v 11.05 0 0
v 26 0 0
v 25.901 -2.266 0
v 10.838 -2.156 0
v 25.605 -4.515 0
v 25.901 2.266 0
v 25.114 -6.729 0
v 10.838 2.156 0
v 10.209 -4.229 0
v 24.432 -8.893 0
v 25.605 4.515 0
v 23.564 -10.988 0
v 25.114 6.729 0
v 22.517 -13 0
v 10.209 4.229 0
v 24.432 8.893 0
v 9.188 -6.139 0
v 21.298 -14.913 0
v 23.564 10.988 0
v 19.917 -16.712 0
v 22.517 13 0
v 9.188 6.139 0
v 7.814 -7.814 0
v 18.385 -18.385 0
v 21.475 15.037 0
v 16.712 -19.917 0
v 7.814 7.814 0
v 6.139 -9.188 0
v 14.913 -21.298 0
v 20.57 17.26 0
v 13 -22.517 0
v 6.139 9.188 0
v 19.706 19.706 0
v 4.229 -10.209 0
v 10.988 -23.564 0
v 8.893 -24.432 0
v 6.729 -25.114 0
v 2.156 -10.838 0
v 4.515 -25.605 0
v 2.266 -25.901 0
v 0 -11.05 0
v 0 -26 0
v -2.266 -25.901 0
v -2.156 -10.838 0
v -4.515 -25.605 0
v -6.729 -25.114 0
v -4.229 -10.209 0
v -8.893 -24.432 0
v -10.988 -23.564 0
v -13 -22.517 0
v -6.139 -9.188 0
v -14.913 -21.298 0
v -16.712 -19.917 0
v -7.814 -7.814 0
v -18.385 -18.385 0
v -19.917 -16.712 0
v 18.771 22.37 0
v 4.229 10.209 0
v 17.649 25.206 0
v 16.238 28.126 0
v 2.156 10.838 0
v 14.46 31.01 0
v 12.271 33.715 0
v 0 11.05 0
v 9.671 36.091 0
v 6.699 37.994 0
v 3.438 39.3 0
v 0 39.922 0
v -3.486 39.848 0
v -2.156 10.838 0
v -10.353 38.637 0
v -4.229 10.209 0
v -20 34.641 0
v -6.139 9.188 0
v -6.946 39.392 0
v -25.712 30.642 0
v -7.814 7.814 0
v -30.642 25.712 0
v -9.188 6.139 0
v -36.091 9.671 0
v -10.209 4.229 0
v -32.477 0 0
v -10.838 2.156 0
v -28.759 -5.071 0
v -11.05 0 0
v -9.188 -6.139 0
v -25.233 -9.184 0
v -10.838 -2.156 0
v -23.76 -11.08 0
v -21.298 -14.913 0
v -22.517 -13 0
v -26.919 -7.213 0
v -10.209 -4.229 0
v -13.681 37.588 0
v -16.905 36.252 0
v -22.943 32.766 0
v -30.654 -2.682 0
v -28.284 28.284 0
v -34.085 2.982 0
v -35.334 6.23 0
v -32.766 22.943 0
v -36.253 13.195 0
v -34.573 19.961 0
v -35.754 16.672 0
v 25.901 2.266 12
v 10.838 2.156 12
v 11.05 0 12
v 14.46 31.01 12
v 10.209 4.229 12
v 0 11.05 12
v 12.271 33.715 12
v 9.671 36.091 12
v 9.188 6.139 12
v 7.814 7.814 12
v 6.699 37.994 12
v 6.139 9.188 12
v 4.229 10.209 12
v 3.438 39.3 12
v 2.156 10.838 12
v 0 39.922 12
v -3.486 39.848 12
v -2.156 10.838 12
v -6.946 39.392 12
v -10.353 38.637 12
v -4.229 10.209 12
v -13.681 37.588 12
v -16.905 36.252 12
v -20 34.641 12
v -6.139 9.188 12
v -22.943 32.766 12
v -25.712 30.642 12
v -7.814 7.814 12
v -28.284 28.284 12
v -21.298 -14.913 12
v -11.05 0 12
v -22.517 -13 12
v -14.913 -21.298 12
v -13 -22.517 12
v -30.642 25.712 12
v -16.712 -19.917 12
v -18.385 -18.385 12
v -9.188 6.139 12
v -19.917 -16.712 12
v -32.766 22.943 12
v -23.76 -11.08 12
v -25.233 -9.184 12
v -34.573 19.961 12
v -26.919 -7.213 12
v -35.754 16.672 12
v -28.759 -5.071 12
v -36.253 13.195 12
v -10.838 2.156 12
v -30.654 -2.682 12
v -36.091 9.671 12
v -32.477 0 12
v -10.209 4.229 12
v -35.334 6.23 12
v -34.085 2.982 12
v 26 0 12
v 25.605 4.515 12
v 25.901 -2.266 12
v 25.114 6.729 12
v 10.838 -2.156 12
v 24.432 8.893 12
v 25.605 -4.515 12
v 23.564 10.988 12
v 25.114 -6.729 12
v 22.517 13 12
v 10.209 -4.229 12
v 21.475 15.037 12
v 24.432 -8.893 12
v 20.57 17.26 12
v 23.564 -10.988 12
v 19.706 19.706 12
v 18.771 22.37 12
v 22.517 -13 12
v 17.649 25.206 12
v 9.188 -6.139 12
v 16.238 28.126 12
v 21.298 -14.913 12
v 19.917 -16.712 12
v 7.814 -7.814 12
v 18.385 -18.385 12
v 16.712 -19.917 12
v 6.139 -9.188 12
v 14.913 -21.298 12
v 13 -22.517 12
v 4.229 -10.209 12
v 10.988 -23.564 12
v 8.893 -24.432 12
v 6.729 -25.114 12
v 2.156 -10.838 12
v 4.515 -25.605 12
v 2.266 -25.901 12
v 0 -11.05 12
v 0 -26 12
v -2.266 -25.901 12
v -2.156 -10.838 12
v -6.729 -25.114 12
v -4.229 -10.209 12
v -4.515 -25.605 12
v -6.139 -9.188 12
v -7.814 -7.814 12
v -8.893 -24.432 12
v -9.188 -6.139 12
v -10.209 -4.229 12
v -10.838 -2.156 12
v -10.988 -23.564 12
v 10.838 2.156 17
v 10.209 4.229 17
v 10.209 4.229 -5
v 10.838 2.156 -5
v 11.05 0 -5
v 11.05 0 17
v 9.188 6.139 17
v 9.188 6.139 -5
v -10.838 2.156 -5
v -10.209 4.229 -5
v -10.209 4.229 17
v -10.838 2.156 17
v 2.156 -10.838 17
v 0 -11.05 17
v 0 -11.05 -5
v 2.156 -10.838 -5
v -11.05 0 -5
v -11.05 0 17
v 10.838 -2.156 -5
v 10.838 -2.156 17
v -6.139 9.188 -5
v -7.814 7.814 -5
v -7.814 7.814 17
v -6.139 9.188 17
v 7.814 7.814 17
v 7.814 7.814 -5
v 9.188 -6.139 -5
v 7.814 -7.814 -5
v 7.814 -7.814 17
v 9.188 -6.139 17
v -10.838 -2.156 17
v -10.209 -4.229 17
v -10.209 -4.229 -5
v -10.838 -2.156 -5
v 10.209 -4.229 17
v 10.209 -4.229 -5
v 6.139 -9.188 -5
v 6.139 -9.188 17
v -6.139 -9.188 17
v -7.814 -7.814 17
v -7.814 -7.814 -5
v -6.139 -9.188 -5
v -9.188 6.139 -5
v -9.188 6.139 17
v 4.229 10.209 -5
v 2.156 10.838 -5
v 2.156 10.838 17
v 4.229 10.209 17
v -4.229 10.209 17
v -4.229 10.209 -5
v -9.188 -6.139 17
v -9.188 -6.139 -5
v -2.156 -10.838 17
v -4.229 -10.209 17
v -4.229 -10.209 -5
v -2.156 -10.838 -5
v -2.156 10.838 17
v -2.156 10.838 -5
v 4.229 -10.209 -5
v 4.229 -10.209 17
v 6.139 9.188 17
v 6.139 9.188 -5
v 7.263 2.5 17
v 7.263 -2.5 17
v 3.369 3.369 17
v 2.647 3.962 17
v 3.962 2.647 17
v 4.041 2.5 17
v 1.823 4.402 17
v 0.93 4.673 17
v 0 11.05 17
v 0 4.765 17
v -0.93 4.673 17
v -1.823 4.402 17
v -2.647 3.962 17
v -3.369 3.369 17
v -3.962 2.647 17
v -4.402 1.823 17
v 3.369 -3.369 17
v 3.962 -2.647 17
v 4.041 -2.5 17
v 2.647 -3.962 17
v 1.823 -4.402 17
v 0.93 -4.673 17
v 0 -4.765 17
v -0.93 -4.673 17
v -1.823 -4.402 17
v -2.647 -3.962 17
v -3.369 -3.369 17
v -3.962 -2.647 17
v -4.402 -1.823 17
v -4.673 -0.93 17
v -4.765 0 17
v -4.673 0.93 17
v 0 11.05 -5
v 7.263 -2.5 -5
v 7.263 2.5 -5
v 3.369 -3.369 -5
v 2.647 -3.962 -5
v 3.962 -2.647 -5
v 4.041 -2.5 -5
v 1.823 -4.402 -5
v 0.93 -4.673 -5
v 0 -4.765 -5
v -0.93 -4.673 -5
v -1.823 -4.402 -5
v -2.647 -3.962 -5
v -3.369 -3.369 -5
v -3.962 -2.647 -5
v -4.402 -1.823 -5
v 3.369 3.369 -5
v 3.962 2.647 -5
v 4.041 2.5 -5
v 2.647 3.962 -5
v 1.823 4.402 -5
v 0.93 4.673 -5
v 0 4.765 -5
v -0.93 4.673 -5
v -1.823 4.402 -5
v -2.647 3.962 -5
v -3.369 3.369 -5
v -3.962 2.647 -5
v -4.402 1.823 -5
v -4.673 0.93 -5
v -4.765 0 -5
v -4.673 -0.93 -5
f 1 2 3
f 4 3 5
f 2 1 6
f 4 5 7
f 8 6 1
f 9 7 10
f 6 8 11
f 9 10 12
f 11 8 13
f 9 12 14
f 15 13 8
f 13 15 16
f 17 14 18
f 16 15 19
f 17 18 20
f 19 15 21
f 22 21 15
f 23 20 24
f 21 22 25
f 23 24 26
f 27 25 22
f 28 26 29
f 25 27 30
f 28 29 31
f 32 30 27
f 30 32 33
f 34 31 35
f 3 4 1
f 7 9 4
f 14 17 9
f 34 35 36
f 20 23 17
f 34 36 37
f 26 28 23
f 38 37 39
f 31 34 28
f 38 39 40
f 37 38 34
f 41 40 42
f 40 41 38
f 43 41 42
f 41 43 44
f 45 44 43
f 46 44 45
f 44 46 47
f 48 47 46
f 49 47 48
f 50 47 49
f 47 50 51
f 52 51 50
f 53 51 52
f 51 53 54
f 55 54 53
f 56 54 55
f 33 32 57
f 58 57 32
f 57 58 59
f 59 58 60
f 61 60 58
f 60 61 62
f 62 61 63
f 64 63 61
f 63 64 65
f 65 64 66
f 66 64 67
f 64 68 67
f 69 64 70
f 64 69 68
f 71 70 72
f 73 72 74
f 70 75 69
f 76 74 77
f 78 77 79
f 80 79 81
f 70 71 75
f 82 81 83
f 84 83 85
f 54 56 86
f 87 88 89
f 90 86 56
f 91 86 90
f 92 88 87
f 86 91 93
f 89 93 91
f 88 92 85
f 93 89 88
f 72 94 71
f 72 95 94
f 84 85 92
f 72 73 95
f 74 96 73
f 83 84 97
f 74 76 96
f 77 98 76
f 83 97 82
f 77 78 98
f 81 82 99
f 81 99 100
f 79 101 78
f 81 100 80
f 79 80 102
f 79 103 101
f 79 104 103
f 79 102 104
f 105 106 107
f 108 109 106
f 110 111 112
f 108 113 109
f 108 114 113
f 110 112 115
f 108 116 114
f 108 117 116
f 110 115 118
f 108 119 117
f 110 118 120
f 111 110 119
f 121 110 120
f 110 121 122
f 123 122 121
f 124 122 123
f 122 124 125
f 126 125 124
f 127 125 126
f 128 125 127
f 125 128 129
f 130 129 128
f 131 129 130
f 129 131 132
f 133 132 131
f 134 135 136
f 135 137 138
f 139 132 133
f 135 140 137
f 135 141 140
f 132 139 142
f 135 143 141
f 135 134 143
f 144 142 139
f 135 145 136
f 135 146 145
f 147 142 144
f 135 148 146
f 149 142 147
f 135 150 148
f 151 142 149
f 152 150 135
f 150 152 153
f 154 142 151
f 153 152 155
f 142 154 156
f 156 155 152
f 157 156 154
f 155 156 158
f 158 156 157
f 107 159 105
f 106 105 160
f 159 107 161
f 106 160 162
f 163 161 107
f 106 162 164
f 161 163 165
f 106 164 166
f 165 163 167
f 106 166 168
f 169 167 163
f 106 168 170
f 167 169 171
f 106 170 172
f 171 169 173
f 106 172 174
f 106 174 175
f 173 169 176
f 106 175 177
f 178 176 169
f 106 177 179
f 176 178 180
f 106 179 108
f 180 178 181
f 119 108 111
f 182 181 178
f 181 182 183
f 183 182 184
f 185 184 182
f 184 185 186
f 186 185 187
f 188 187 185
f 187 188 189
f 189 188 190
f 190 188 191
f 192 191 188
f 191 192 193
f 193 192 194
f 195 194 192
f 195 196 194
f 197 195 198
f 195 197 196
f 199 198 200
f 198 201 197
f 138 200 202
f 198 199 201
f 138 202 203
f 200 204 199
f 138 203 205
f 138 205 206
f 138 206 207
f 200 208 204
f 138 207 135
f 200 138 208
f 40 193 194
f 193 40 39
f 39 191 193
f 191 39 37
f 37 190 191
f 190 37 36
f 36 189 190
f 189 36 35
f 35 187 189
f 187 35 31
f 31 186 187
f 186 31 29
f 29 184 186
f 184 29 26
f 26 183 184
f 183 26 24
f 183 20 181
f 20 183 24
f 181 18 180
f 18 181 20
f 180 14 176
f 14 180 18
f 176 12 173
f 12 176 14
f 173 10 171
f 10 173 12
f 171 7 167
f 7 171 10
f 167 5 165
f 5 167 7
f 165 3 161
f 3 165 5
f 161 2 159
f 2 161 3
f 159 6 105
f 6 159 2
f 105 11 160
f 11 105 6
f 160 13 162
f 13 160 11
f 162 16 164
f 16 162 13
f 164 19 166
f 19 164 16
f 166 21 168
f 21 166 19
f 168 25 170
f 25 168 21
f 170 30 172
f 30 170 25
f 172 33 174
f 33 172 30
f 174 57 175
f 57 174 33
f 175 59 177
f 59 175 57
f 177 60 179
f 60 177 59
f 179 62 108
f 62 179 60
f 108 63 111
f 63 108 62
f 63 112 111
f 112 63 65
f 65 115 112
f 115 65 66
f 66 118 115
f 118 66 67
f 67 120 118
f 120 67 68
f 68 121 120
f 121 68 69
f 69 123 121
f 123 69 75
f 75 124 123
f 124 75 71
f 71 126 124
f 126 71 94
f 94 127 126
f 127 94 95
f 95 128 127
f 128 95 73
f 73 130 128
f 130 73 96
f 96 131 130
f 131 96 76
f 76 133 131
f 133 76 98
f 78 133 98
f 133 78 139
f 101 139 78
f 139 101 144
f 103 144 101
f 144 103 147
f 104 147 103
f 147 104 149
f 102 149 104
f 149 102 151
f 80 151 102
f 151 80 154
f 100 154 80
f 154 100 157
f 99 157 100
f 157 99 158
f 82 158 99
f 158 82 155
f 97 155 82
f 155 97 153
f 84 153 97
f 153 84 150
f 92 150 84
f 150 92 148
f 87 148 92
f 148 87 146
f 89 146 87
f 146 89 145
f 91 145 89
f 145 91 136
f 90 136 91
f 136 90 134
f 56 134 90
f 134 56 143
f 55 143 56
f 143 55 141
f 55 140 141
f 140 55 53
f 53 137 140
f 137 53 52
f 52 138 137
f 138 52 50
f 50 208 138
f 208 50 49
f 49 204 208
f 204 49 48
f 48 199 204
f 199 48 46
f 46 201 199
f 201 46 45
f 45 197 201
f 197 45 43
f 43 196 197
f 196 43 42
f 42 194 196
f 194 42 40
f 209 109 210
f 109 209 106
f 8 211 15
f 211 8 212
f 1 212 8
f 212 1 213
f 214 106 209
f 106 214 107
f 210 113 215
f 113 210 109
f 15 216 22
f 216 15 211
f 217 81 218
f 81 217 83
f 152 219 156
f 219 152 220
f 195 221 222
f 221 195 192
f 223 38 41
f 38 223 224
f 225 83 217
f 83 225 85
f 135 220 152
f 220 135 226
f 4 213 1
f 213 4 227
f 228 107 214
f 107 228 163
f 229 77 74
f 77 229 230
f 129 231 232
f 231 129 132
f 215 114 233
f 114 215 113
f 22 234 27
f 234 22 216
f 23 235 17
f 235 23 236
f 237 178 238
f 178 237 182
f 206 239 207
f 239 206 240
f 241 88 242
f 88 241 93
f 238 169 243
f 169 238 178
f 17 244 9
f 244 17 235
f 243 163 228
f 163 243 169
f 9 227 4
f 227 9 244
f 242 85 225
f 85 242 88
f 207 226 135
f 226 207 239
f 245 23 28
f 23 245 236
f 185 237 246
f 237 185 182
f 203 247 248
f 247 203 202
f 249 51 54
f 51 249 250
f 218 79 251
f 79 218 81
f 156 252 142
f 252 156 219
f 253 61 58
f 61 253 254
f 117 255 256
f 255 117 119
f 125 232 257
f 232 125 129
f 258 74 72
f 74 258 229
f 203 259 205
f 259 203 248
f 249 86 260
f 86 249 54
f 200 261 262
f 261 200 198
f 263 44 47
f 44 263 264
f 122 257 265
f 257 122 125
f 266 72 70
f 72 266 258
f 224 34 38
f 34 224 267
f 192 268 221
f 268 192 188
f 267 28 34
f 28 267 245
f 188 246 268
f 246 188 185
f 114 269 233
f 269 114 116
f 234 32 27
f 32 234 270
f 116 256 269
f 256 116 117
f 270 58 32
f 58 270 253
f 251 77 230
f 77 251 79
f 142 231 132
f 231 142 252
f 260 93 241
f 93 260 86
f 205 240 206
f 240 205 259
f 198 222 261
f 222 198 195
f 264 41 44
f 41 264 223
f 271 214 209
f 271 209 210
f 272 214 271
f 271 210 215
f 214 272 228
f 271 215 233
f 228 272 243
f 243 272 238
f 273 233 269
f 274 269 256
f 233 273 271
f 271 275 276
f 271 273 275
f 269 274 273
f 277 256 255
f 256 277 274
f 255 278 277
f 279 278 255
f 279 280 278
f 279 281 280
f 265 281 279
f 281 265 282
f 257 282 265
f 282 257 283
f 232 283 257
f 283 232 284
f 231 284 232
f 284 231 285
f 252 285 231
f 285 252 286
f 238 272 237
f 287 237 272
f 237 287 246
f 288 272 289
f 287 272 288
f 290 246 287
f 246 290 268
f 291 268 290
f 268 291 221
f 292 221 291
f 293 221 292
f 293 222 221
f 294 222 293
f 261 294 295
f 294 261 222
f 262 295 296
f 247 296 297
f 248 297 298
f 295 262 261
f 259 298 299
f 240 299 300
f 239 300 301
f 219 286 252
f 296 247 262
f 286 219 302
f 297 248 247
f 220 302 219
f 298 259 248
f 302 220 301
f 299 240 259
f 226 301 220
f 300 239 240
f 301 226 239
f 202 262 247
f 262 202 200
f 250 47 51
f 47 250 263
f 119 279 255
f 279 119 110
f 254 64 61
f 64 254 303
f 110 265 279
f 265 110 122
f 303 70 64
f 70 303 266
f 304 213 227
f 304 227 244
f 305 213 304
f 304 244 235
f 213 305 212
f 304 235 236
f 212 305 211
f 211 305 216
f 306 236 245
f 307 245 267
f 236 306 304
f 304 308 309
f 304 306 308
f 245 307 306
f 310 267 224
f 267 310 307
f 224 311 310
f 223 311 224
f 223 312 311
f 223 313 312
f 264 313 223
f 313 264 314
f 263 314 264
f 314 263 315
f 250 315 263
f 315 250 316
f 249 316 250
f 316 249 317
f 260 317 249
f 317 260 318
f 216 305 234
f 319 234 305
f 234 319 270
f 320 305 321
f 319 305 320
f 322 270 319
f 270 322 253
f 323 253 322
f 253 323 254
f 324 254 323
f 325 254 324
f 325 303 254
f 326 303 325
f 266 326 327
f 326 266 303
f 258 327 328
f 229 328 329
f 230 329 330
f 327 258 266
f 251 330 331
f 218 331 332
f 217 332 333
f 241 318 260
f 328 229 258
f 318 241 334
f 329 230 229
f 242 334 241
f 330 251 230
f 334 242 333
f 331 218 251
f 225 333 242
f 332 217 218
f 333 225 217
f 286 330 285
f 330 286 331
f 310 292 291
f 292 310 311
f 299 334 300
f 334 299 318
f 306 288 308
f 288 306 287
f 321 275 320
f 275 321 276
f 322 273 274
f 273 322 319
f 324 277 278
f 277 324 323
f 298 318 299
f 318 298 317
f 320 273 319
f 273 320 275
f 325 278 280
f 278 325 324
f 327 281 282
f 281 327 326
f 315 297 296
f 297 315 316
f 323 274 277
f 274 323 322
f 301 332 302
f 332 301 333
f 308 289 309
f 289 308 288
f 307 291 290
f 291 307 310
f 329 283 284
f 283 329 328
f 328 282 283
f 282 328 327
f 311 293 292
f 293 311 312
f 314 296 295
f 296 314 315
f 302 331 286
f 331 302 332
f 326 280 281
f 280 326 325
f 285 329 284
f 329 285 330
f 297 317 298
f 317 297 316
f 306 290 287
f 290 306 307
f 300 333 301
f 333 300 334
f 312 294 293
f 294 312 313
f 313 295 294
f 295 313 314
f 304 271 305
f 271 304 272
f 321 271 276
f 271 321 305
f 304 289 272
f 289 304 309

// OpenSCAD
$fn = 32;

// ----------------------------------------------------------------------
// Cam: base radius 26 mm with a 14 mm lift over 180 degrees
// ----------------------------------------------------------------------

// --- parameters (mm) ---
base_r = 26;              // base radius
lift = 14;                // lift height above the base radius
lift_span = 180;          // angular width of the lift
lift_start = 30;          // angle where the lift starts
cam_t = 12;               // cam plate thickness
hub_d = 22.1;             // hub diameter
hub_h = 22;               // hub height
bore_d = 9.53;            // bore
key_w = 5;                // keyway width
key_depth = 2.5;          // keyway depth

cam_profile = [[26, 0], [25.901, 2.266], [25.605, 4.515], [25.114, 6.729], [24.432, 8.893], [23.564, 10.988], [22.517, 13], [21.475, 15.037], [20.57, 17.26], [19.706, 19.706], [18.771, 22.37], [17.649, 25.206], [16.238, 28.126], [14.46, 31.01], [12.271, 33.715], [9.671, 36.091], [6.699, 37.994], [3.438, 39.3], [0, 39.922], [-3.486, 39.848], [-6.946, 39.392], [-10.353, 38.637], [-13.681, 37.588], [-16.905, 36.252], [-20, 34.641], [-22.943, 32.766], [-25.712, 30.642], [-28.284, 28.284], [-30.642, 25.712], [-32.766, 22.943], [-34.573, 19.961], [-35.754, 16.672], [-36.253, 13.195], [-36.091, 9.671], [-35.334, 6.23], [-34.085, 2.982], [-32.477, 0], [-30.654, -2.682], [-28.759, -5.071], [-26.919, -7.213], [-25.233, -9.184], [-23.76, -11.08], [-22.517, -13], [-21.298, -14.913], [-19.917, -16.712], [-18.385, -18.385], [-16.712, -19.917], [-14.913, -21.298], [-13, -22.517], [-10.988, -23.564], [-8.893, -24.432], [-6.729, -25.114], [-4.515, -25.605], [-2.266, -25.901], [0, -26], [2.266, -25.901], [4.515, -25.605], [6.729, -25.114], [8.893, -24.432], [10.988, -23.564], [13, -22.517], [14.913, -21.298], [16.712, -19.917], [18.385, -18.385], [19.917, -16.712], [21.298, -14.913], [22.517, -13], [23.564, -10.988], [24.432, -8.893], [25.114, -6.729], [25.605, -4.515], [25.901, -2.266]];

difference() {
  union() {
    linear_extrude(height = cam_t) polygon(cam_profile);
    /* hub, proud of the cam plate on both sides */
    translate([0, 0, -5]) cylinder(h = hub_h, d = hub_d);
  }
  /* bore through the hub, 2.5 mm clear on both faces */
  translate([0, 0, -7.5]) cylinder(h = hub_h + 5, d = bore_d);
  /* keyway, milled through the whole hub */
  translate([2.263, -2.5, -7.5]) cube([5, 5, 27]);
}
